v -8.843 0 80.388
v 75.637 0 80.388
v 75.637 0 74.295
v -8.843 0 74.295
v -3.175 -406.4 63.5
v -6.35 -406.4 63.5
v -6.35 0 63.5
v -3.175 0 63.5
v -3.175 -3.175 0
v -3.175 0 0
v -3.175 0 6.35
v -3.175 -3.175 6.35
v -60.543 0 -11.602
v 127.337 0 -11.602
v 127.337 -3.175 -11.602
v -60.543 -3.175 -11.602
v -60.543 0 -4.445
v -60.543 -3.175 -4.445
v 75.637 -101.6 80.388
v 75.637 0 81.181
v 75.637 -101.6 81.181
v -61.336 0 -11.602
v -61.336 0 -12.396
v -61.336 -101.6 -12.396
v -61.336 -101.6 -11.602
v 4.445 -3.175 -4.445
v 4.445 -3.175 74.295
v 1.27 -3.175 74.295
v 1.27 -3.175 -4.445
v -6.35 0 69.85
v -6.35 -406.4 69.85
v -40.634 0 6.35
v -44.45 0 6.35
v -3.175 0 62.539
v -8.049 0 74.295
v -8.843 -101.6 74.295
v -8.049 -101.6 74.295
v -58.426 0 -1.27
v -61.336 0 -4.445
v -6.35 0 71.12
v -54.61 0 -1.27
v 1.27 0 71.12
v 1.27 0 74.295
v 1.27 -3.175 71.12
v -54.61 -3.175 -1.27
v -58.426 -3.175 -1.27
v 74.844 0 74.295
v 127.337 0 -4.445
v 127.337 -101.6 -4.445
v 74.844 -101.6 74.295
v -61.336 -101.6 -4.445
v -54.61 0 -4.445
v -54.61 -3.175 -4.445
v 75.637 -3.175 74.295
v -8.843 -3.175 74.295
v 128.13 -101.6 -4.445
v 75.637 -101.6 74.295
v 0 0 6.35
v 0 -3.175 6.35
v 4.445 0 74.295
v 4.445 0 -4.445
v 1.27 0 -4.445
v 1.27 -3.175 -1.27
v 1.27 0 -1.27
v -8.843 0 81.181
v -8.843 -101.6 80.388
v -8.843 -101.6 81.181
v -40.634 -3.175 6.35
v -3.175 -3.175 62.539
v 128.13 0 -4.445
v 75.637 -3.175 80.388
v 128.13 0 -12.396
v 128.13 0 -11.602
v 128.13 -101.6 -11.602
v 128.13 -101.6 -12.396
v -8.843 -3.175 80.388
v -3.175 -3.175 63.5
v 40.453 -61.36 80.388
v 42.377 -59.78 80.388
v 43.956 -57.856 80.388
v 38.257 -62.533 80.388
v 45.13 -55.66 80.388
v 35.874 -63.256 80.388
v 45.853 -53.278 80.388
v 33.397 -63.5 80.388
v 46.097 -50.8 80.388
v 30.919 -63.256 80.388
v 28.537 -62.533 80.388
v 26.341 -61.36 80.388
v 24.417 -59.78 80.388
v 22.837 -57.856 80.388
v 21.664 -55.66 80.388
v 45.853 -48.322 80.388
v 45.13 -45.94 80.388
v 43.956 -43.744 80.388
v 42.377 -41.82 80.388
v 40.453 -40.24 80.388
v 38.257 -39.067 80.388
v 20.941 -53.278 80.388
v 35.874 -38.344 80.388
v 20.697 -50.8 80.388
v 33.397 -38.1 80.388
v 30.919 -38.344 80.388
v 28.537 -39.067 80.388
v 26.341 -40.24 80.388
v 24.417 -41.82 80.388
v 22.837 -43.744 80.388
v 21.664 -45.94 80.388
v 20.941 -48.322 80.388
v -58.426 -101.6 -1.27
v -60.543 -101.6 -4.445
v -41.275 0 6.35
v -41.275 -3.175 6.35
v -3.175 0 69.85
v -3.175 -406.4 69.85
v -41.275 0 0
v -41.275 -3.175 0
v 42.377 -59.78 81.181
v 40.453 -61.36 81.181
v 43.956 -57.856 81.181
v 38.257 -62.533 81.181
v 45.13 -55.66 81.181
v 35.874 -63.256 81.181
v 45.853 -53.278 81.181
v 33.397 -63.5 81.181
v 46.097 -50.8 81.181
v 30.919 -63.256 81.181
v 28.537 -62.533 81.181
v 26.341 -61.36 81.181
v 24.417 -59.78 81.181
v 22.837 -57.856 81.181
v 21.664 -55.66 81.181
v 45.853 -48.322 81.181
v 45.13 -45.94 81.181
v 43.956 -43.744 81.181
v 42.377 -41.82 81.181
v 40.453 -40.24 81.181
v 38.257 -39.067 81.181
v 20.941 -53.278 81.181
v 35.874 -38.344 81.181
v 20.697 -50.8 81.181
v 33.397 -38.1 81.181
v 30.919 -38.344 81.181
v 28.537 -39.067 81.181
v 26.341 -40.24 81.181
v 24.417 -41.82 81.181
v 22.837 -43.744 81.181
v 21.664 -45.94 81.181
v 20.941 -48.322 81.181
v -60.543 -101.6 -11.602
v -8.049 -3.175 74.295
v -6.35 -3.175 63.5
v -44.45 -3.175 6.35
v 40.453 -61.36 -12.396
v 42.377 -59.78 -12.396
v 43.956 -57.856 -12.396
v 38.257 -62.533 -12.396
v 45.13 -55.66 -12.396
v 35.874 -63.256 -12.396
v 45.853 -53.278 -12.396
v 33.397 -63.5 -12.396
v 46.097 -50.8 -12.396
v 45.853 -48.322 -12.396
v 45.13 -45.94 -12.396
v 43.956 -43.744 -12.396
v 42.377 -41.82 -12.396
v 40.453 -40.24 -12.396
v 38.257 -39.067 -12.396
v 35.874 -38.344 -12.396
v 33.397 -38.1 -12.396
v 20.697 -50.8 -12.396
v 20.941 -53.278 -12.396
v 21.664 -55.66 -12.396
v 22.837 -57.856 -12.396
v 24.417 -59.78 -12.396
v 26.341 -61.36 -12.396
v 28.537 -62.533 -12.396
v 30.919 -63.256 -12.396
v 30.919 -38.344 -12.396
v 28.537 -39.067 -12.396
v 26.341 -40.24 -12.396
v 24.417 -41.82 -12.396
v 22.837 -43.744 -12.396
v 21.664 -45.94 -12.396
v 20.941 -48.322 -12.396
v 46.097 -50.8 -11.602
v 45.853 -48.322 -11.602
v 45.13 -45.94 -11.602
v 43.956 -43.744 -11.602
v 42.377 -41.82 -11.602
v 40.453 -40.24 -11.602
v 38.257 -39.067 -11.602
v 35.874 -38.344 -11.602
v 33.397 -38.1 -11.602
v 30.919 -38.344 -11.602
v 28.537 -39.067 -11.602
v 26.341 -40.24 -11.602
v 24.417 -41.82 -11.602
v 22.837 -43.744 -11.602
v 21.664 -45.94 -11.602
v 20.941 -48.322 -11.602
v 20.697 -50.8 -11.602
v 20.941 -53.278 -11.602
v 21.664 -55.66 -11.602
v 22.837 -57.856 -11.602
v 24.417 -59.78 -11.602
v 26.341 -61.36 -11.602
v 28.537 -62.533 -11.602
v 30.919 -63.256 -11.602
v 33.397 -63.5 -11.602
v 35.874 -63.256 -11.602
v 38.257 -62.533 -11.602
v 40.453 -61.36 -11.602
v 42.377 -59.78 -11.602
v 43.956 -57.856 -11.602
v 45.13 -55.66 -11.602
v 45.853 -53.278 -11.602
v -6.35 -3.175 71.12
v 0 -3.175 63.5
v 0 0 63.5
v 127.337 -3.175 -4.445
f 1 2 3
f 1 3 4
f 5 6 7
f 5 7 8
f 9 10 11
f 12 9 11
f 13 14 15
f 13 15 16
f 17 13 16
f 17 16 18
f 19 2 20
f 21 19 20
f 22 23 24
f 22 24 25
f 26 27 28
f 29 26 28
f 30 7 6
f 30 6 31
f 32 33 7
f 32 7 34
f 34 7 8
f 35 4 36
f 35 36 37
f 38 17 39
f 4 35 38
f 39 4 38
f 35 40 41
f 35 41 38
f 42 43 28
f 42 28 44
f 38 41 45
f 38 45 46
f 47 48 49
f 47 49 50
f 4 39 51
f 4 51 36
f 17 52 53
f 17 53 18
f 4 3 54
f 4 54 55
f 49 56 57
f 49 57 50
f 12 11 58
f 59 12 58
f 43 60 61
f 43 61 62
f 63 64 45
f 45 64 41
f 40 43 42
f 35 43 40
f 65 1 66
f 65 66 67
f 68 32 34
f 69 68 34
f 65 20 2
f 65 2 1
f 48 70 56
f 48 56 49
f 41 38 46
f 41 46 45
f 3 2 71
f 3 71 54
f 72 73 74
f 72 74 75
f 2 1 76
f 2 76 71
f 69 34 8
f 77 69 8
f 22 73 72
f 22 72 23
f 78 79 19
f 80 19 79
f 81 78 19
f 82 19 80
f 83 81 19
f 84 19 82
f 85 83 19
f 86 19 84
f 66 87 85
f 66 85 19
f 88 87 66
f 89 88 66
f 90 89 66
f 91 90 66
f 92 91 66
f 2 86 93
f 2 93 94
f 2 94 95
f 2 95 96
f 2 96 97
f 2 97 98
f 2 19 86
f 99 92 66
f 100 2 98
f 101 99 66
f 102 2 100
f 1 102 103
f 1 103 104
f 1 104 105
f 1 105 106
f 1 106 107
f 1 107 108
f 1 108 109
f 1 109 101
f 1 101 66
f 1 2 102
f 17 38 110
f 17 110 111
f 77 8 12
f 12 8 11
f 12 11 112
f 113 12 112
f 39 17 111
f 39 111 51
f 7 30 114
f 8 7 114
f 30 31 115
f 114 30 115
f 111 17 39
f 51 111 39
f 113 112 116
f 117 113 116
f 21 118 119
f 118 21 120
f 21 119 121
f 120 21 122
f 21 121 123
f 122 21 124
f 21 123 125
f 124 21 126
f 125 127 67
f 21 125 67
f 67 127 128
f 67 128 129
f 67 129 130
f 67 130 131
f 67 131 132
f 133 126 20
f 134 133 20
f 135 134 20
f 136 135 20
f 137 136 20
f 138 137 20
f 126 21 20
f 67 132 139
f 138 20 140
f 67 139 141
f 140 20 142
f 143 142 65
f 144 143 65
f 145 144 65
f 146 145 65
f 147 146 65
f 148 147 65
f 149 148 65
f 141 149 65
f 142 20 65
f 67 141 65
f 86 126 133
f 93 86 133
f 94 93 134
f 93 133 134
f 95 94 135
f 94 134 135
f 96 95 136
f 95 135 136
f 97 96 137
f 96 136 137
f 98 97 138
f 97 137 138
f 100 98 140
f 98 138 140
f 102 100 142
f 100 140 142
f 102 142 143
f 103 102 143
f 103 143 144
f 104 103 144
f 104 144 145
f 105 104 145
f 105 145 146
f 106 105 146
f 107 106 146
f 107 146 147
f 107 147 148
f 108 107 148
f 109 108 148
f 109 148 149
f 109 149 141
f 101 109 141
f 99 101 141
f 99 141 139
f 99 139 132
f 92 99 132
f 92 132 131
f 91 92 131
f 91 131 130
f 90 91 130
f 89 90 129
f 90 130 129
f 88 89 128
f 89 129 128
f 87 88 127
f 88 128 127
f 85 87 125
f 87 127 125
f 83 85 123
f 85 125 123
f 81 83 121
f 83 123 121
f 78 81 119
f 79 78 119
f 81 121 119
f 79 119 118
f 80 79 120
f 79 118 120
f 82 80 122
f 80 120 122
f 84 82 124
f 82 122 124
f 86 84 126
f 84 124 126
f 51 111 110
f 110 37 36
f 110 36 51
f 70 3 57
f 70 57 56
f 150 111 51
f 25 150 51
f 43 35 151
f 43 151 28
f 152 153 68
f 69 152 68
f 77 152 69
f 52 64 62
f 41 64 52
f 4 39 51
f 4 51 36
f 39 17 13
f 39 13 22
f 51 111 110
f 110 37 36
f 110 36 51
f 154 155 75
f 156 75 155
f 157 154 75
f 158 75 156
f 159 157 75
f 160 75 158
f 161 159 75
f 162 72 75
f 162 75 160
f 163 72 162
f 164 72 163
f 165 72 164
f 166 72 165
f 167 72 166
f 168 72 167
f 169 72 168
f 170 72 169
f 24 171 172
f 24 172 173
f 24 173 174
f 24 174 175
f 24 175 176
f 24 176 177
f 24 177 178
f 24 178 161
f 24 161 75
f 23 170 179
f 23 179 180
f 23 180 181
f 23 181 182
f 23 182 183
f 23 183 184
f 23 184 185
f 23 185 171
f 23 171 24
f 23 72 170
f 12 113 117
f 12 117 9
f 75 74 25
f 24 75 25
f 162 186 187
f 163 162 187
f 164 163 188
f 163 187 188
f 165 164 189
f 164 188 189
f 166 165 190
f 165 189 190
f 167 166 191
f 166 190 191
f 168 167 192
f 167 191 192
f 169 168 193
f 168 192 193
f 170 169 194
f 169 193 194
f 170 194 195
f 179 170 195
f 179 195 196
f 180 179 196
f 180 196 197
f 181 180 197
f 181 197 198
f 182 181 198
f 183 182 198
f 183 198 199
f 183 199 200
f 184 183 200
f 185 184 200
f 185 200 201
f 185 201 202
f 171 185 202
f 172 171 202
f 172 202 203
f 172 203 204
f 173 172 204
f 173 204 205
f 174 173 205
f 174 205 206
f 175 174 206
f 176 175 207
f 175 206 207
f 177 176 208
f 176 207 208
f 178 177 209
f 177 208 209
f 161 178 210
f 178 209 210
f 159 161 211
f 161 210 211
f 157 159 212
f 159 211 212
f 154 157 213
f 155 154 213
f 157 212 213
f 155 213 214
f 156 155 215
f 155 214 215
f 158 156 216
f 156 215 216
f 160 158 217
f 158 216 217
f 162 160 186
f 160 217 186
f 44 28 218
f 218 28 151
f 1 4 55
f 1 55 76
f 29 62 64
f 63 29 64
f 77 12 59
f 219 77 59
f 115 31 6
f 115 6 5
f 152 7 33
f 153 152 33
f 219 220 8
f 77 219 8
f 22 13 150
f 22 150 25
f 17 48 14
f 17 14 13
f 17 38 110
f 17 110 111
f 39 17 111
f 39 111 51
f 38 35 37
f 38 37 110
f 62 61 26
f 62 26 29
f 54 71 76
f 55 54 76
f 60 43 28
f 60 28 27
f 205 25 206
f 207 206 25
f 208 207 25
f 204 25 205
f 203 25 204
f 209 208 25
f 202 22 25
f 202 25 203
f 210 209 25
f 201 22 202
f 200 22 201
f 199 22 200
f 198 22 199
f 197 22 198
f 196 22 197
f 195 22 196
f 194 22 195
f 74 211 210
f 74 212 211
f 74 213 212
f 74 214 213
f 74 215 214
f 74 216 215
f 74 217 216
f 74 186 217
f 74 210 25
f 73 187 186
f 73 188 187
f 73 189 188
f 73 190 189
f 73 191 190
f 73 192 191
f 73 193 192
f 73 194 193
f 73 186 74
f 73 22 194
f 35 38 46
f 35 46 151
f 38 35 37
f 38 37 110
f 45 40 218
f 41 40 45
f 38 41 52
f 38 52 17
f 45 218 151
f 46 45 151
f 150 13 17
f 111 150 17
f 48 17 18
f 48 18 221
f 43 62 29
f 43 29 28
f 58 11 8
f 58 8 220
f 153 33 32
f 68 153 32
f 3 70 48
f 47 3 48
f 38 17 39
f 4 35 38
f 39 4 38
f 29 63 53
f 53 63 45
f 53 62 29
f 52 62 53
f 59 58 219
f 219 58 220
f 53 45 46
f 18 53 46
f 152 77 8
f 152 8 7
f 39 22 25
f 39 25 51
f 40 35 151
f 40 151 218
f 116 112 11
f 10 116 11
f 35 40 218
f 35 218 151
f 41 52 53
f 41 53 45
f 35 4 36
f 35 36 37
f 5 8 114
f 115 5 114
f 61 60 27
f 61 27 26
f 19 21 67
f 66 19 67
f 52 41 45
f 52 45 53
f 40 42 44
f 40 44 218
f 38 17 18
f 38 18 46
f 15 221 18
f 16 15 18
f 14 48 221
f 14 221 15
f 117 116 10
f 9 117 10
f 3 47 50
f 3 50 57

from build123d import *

# Parameters (mm, degrees)
F0_W      = 3.175
F0_H      = 6.35
F1_DEPTH  = 406.4
F2_DEPTH  = 3.175
F3_DEPTH  = 3.175
F4_DEPTH  = 3.175
F6_DEPTH  = 3.175
F7_DEPTH  = 101.6
F8_DEPTH  = 3.175
F9_DEPTH  = 3.175
F10_DEPTH = 3.175
F11_DEPTH = 3.175
F5_W      = 55.88
F5_H      = 3.175
F12_DEPTH = 3.175
F5_W_2    = 84.479583
F5_H_2    = 0.79375
F13_DEPTH = 101.6
F14_R     = 12.7
F15_DEPTH = 93.577917
F16_DEPTH = 101.6
F5_W_3    = 0.79375
F5_H_3    = 7.156894
F17_DEPTH = 101.6
F18_DEPTH = 3.175
F19_DEPTH = 101.6


with BuildPart() as f1:
    # F0 (on Front) → F1 (new body)
    with BuildSketch(Plane.XZ):
        with Locations((-4.7625, 66.675)):
            Rectangle(F0_W, F0_H)
    extrude(amount=F1_DEPTH)


with BuildPart() as f2:
    # F0 (on Front) → F2 (new body)
    with BuildSketch(Plane.XZ):
        Polygon((-41.275, 6.35), (-41.275, 0), (-3.175, 0), (-3.175, 6.35), (-40.634125, 6.35), align=None)
    extrude(amount=F2_DEPTH)


with BuildPart() as f3:
    # F0 (on Front) → F3 (new body)
    with BuildSketch(Plane.XZ):
        Polygon((-6.35, 63.5), (-44.45, 6.35), (-41.275, 6.35), (-40.634125, 6.35), (-3.175, 62.538687), (-3.175, 63.5), align=None)
    extrude(amount=F3_DEPTH)


with BuildPart() as f4:
    # F0 (on Front) → F4 (new body)
    with BuildSketch(Plane.XZ):
        Polygon((-3.175, 62.538687), (-3.175, 6.35), (0, 6.35), (0, 63.5), (-3.175, 63.5), align=None)
    extrude(amount=F4_DEPTH)


with BuildPart() as f6:
    # F5 (on face) → F6 (new body)
    with BuildSketch(Plane(origin=(0, 0, 0), x_dir=(-1, 0, 0), z_dir=(0, 1, 0))):
        Polygon((-4.445, 74.295), (-1.27, 74.295), (8.049208, 74.295), (8.842958, 74.295), (8.842958, 80.387522), (-75.636625, 80.387522), (-75.636625, 74.295), (-74.844145, 74.295), align=None)
    extrude(amount=-F6_DEPTH)


with BuildPart() as f7:
    # F5 (on face) → F7 (new body)
    with BuildSketch(Plane(origin=(0, 0, 0), x_dir=(-1, 0, 0), z_dir=(0, 1, 0))):
        Polygon((8.842958, 74.295), (8.049208, 74.295), (58.425875, -1.27), (60.542542, -4.445), (61.336292, -4.445), align=None)
    extrude(amount=-F7_DEPTH)


with BuildPart() as f8:
    # F5 (on face) → F8 (new body)
    with BuildSketch(Plane(origin=(0, 0, 0), x_dir=(-1, 0, 0), z_dir=(0, 1, 0))):
        Polygon((-1.27, 74.295), (-1.27, 71.12), (6.35, 71.12), (8.049208, 74.295), align=None)
    extrude(amount=-F8_DEPTH)


with BuildPart() as f9:
    # F5 (on face) → F9 (new body)
    with BuildSketch(Plane(origin=(0, 0, 0), x_dir=(-1, 0, 0), z_dir=(0, 1, 0))):
        Polygon((8.049208, 74.295), (6.35, 71.12), (54.61, -1.27), (58.425875, -1.27), align=None)
    extrude(amount=-F9_DEPTH)


with BuildPart() as f10:
    # F5 (on face) → F10 (new body)
    with BuildSketch(Plane(origin=(0, 0, 0), x_dir=(-1, 0, 0), z_dir=(0, 1, 0))):
        Polygon((-1.27, -1.27), (-1.27, 71.12), (-1.27, 74.295), (-4.445, 74.295), (-4.445, -4.445), (-1.27, -4.445), align=None)
    extrude(amount=-F10_DEPTH)


with BuildPart() as f11:
    # F5 (on face) → F11 (new body)
    with BuildSketch(Plane(origin=(0, 0, 0), x_dir=(-1, 0, 0), z_dir=(0, 1, 0))):
        Polygon((58.425875, -1.27), (54.61, -1.27), (54.61, -4.445), (60.542542, -4.445), align=None)
    extrude(amount=-F11_DEPTH)


with BuildPart() as f12:
    # F5 (on face) → F12 (new body)
    with BuildSketch(Plane(origin=(0, 0, 0), x_dir=(-1, 0, 0), z_dir=(0, 1, 0))):
        with Locations((26.67, -2.8575)):
            Rectangle(F5_W, F5_H)
    extrude(amount=-F12_DEPTH)


with BuildPart() as f13:
    # F5 (on face) → F13 (new body)
    with BuildSketch(Plane(origin=(0, 0, 0), x_dir=(-1, 0, 0), z_dir=(0, 1, 0))):
        Polygon((61.336292, -11.601894), (60.542542, -11.601894), (-127.337479, -11.601894), (-128.129959, -11.601894), (-128.129959, -12.395644), (61.336292, -12.395644), align=None)
        with Locations((-33.396833, 80.784397)):
            Rectangle(F5_W_2, F5_H_2)
    extrude(amount=-F13_DEPTH)

    # F14 (on face) → F15 (cut, through all)
    with BuildSketch(Plane.XY.offset(81.181272)):
        with Locations((33.396833, -50.8)):
            Circle(F14_R)
    extrude(amount=-F15_DEPTH, mode=Mode.SUBTRACT)


with BuildPart() as f16:
    # F5 (on face) → F16 (new body)
    with BuildSketch(Plane(origin=(0, 0, 0), x_dir=(-1, 0, 0), z_dir=(0, 1, 0))):
        Polygon((8.842958, 74.295), (8.049208, 74.295), (58.425875, -1.27), (60.542542, -4.445), (61.336292, -4.445), align=None)
    extrude(amount=-F16_DEPTH)


with BuildPart() as f17:
    # F5 (on face) → F17 (new body)
    with BuildSketch(Plane(origin=(0, 0, 0), x_dir=(-1, 0, 0), z_dir=(0, 1, 0))):
        with Locations((60.939417, -8.023447)):
            Rectangle(F5_W_3, F5_H_3)
    extrude(amount=-F17_DEPTH)


with BuildPart() as f18:
    # F5 (on face) → F18 (new body)
    with BuildSketch(Plane(origin=(0, 0, 0), x_dir=(-1, 0, 0), z_dir=(0, 1, 0))):
        Polygon((54.61, -4.445), (-1.27, -4.445), (-4.445, -4.445), (-127.337479, -4.445), (-127.337479, -11.601894), (60.542542, -11.601894), (60.542542, -4.445), align=None)
    extrude(amount=-F18_DEPTH)


with BuildPart() as f19:
    # F5 (on face) → F19 (new body)
    with BuildSketch(Plane(origin=(0, 0, 0), x_dir=(-1, 0, 0), z_dir=(0, 1, 0))):
        Polygon((-127.337479, -4.445), (-74.844145, 74.295), (-75.636625, 74.295), (-128.129959, -4.445), align=None)
    extrude(amount=-F19_DEPTH)


solid = Compound([f1.part, f2.part, f3.part, f4.part, f6.part, f7.part, f8.part, f9.part, f10.part, f11.part, f12.part, f13.part, f16.part, f17.part, f18.part, f19.part])
